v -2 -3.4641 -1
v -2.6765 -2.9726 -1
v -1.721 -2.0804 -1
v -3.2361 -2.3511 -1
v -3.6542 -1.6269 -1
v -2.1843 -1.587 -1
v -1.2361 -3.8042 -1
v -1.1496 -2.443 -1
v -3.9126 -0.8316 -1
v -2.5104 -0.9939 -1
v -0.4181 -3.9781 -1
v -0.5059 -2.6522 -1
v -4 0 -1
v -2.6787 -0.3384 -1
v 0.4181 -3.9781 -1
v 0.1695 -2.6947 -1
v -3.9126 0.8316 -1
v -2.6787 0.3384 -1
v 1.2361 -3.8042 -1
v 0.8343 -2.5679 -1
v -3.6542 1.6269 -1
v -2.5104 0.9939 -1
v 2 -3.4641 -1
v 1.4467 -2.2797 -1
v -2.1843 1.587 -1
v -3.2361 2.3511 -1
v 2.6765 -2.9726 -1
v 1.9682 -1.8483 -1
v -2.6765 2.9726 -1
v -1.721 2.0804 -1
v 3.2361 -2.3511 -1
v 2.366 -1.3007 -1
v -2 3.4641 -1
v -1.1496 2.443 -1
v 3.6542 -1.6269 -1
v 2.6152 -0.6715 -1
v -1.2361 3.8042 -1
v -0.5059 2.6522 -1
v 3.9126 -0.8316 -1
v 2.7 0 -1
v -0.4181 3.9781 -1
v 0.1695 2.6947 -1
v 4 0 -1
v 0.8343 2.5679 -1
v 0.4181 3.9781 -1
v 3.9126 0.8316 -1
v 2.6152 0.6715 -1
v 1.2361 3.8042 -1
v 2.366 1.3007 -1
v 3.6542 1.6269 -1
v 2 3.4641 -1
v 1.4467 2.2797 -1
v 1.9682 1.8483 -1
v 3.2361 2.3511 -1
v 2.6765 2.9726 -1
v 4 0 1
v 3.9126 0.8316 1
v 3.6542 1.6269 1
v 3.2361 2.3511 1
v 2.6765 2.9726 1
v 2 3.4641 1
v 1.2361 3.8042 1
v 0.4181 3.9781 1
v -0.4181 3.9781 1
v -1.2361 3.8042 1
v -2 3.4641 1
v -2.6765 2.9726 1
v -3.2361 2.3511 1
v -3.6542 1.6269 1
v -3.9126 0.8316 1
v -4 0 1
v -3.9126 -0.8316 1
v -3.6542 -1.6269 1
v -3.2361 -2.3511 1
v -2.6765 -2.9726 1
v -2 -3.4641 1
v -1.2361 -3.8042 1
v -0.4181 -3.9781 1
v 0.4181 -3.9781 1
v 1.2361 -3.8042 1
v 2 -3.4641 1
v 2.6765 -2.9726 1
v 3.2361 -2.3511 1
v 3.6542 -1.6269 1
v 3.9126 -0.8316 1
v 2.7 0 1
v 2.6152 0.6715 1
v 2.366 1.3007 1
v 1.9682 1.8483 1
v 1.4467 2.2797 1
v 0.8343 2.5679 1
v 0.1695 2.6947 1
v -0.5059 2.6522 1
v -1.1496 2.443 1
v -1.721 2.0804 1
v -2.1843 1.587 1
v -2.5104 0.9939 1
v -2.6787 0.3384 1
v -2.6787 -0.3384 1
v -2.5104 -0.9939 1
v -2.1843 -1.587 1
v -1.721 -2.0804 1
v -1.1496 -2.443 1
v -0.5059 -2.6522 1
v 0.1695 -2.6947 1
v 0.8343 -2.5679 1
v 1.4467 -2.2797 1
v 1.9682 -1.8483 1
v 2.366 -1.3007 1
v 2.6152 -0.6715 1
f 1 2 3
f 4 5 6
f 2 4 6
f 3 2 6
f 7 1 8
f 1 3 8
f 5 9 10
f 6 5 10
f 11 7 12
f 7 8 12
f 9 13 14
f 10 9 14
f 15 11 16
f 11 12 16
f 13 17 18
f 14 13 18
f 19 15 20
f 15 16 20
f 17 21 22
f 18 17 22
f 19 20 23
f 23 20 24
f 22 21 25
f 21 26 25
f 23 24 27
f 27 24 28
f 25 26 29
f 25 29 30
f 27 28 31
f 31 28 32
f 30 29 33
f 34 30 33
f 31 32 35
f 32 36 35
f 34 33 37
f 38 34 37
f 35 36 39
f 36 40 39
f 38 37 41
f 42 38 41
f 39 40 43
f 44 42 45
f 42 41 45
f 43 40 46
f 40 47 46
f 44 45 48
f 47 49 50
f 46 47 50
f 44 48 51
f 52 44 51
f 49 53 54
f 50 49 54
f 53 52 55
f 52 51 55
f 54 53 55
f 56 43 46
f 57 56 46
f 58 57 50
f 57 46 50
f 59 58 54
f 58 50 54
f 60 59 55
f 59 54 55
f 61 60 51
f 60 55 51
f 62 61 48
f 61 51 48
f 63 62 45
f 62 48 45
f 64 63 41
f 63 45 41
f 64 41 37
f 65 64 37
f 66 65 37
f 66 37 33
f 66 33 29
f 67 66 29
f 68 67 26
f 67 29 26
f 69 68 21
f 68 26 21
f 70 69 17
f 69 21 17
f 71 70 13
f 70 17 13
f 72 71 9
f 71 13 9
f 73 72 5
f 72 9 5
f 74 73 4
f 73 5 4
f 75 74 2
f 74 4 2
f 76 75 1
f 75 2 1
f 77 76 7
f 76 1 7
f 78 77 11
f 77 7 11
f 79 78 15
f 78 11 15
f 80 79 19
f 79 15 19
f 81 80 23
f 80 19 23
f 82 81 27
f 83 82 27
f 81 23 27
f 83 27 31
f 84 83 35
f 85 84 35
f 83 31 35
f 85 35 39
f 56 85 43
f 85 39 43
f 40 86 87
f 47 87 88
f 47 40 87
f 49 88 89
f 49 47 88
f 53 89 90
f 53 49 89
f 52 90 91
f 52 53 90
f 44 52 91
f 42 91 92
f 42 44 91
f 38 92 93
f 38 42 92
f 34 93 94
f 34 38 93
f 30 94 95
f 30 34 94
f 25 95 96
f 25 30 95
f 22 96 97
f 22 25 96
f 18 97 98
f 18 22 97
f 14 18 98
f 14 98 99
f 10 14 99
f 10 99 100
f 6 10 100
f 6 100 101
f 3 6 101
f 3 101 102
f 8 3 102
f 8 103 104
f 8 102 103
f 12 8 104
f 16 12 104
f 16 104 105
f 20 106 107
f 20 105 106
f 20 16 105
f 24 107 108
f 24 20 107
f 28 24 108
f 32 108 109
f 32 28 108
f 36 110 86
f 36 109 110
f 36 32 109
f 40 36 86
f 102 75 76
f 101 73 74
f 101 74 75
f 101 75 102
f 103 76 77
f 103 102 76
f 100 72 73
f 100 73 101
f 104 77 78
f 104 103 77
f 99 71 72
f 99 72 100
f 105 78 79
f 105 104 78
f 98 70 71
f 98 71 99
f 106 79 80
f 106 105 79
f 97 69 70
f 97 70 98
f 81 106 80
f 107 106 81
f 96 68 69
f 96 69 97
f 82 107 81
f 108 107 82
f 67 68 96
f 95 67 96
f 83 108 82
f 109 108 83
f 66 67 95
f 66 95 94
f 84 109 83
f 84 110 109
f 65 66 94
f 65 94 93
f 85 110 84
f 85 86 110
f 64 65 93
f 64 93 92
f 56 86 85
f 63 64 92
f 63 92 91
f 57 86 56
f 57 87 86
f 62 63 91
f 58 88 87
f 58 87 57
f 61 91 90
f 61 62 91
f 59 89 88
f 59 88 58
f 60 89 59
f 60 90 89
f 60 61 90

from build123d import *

# Parameters (mm, degrees)
CYLINDER014005848_R     = 2.7
CYLINDER014005848_DEPTH = 3
CYLINDER014005847_R     = 4
CYLINDER014005847_DEPTH = 2


with BuildPart() as v_lec741:
    # Cylinder014005848 → Cylinder014005848 (new body)
    with BuildSketch(Plane.XY.offset(-1)):
        Circle(CYLINDER014005848_R)
    extrude(amount=CYLINDER014005848_DEPTH)


with BuildPart() as podlozka:
    # Cylinder014005847 → Cylinder014005847 (new body)
    with BuildSketch(Plane.XY.offset(-1)):
        Circle(CYLINDER014005847_R)
    extrude(amount=CYLINDER014005847_DEPTH)

    # Cut061311: cut Válec741
    add(v_lec741.part, mode=Mode.SUBTRACT)


solid = podlozka.part
